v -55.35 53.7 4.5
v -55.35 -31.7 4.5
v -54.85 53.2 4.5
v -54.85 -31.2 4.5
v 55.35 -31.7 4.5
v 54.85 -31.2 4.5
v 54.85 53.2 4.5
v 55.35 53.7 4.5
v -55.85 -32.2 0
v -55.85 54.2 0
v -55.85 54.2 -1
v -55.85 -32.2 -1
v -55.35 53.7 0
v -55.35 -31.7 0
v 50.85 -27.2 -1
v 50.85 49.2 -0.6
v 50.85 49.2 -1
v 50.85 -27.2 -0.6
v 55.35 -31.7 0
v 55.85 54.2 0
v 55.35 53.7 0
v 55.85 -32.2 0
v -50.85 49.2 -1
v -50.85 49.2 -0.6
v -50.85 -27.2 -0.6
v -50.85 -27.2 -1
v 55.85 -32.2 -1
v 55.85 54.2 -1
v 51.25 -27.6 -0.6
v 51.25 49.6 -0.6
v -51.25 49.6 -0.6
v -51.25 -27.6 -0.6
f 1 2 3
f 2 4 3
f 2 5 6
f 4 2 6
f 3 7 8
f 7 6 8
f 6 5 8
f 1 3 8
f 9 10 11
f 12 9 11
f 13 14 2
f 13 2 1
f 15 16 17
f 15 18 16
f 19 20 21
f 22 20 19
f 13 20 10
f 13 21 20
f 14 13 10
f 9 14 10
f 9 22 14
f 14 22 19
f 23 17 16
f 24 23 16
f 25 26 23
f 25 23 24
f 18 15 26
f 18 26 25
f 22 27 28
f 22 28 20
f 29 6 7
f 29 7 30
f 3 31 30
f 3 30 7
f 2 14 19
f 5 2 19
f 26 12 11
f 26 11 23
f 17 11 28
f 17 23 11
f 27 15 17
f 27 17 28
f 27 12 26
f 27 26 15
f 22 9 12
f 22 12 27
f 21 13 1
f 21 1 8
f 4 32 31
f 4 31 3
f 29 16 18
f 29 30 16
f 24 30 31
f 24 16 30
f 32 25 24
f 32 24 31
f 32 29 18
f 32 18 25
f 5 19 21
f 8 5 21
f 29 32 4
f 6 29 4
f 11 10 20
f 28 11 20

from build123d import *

# Parameters (mm, degrees)
SKETCH015_W       = 111.7
SKETCH015_H       = 86.4
PAD007_DEPTH      = 1
SKETCH016_W       = 110.7
SKETCH016_H       = 85.4
PAD008_DEPTH      = 5.5
PAD005_DEPTH      = 55.85
PAD005_DEPTH_BACK = 55.85
PAD004_DEPTH      = 43.2
PAD004_DEPTH_BACK = 43.2


with BuildPart() as pad_bezel_lip:
    # Sketch015 → Pad007 (new body)
    with BuildSketch(Plane.XY):
        Rectangle(SKETCH015_W, SKETCH015_H)
    extrude(amount=-PAD007_DEPTH)


with BuildPart() as fusion_bezel_overlap:
    # Sketch016 → Pad008 (new body)
    with BuildSketch(Plane.XY):
        Rectangle(SKETCH016_W, SKETCH016_H)
    extrude(amount=PAD008_DEPTH)

    # Fusion002: union Pad (bezel lip)
    add(pad_bezel_lip.part)


with BuildPart() as pad_bezel_top_bottom:
    # Sketch006 → Pad005 (new body, two sides)
    with BuildSketch(Plane.YZ) as pad005_sk:
        Polygon((43.2, -1), (38.2, -1), (38.2, -0.6), (38.6, -0.6), (42.2, 4.5), (42.7, 4.5), (42.7, 0), (43.2, 0), align=None)
        Polygon((-38.6, -0.6), (-42.2, 4.5), (-42.7, 4.5), (-42.7, 0), (-43.2, 0), (-43.2, -1), (-38.2, -1), (-38.2, -0.6), align=None)
    extrude(amount=PAD005_DEPTH)
    extrude(pad005_sk.sketch, amount=-PAD005_DEPTH_BACK)


with BuildPart() as common:
    # Sketch005 → Pad004 (new body, two sides)
    with BuildSketch(Plane.XZ) as pad004_sk:
        Polygon((-55.85, -1), (-50.85, -1), (-50.85, -0.6), (-51.25, -0.6), (-54.85, 4.5), (-55.35, 4.5), (-55.35, 0), (-55.85, 0), align=None)
        Polygon((50.85, -1), (55.85, -1), (55.85, 0), (55.35, 0), (55.35, 4.5), (54.85, 4.5), (51.25, -0.6), (50.85, -0.6), align=None)
    extrude(amount=PAD004_DEPTH)
    extrude(pad004_sk.sketch, amount=-PAD004_DEPTH_BACK)

    # Fusion: union Pad (bezel top/bottom)
    add(pad_bezel_top_bottom.part)

    # Common: intersect Fusion (bezel overlap)
    add(fusion_bezel_overlap.part, mode=Mode.INTERSECT)


with BuildPart() as common_1:
    # Common placement: moved
    add(common.part.moved(Location((0, 11, 0))))


solid = common_1.part
